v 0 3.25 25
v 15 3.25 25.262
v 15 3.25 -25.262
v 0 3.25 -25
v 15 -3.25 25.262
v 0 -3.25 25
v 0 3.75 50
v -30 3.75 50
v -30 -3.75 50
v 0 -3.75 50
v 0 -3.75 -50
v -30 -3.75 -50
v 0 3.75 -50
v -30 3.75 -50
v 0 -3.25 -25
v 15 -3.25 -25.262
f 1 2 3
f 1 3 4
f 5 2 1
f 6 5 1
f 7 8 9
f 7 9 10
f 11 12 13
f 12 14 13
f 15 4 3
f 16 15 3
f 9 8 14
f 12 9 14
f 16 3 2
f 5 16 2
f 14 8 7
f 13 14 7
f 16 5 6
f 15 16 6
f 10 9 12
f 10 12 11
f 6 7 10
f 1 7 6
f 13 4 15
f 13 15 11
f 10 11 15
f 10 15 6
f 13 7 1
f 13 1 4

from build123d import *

# Parameters (mm, degrees)
SKETCH1_W           = 30
SKETCH1_H           = 100
BOSS_EXTRUDE1_DEPTH = 3.75
BOSS_EXTRUDE2_START = -0.5
BOSS_EXTRUDE2_DEPTH = 6.5


with BuildPart() as part:
    # Sketch1 → Boss-Extrude1 (new, symmetric)
    with BuildSketch(Plane(origin=(0, 0, 0), x_dir=(1, 0, 0), z_dir=(0, 1, 0))):
        with Locations((-15, 0)):
            Rectangle(SKETCH1_W, SKETCH1_H)
    extrude(amount=BOSS_EXTRUDE1_DEPTH, both=True)

    # Sketch2 → Boss-Extrude2 (add)
    with BuildSketch(Plane(origin=(0, 3.75, 0), x_dir=(1, 0, 0), z_dir=(0, 1, 0)).offset(BOSS_EXTRUDE2_START)):
        Polygon((0, 25), (15, 25.261825974), (15, -25.261825974), (0, -25), align=None)
    extrude(amount=-BOSS_EXTRUDE2_DEPTH)


solid = part.part
